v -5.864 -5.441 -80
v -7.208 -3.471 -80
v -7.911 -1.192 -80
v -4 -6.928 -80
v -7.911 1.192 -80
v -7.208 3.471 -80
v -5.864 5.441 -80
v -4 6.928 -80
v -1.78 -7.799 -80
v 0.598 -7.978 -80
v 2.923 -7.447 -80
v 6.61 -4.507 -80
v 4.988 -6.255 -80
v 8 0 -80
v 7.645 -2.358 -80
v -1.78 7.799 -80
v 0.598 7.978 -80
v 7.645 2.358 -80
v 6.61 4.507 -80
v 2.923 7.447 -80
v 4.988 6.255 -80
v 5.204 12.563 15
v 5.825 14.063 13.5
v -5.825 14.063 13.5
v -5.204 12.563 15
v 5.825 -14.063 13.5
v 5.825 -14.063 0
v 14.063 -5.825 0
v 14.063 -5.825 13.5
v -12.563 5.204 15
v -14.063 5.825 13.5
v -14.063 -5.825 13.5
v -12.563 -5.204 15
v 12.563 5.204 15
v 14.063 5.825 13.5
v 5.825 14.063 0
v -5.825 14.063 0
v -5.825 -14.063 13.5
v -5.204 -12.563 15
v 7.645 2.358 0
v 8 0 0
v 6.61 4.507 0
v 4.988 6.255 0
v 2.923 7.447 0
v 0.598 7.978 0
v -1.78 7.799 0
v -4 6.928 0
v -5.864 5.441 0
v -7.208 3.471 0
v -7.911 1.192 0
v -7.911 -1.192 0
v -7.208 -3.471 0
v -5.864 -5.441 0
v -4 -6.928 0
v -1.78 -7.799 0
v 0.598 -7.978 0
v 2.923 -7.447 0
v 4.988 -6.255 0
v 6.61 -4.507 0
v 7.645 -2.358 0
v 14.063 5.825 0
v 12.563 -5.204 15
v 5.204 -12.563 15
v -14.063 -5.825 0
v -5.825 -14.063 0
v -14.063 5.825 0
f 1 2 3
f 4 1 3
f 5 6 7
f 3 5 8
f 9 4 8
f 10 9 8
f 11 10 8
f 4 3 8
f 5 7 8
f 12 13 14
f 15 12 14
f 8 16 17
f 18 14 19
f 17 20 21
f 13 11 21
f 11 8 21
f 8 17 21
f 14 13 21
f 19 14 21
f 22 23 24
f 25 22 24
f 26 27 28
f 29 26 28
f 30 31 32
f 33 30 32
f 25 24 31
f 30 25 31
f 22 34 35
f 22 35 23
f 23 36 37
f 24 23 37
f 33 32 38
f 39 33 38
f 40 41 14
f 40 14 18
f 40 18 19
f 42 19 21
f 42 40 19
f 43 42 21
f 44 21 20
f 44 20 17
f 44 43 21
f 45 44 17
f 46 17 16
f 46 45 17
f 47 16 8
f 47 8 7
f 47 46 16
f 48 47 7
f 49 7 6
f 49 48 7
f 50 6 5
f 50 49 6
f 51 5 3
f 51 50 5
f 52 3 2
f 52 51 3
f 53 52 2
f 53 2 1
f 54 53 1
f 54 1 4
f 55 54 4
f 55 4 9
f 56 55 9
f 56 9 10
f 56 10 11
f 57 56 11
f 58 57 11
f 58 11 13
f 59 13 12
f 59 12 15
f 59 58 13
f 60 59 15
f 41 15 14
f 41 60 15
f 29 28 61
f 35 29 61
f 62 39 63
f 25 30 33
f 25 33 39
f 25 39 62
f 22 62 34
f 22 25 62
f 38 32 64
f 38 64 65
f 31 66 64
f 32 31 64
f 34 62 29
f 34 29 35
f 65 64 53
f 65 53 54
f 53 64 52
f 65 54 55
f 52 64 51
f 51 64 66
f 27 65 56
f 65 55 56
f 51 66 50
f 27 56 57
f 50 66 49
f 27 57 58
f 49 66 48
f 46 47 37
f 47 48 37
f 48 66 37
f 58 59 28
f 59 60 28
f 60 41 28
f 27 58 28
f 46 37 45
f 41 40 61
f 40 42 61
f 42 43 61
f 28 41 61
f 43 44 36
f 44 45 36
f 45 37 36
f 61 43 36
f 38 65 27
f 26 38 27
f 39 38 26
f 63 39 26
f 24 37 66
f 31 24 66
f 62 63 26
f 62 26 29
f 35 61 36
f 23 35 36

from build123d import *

# Parameters (mm, degrees)
F2_DEPTH = 15
F0_R     = 8
F3_DEPTH = 80
F4_SIZE  = 1.5


with BuildPart() as f2:
    # F1 (on face) → F2 (new body)
    with BuildSketch(Plane.XY):
        Polygon((14.062501, -5.824878), (14.062501, 5.824878), (5.824878, 14.062501), (-5.824878, 14.062501), (-14.062501, 5.824878), (-14.062501, -5.824878), (-5.824878, -14.062501), (5.824878, -14.062501), align=None)
    extrude(amount=F2_DEPTH)

    # F0 (on Top) → F3 (join)
    with BuildSketch(Plane.XY):
        Circle(F0_R)
    extrude(amount=-F3_DEPTH)

    # F4
    f4_edges = [f2.edges().sort_by_distance(p)[0] for p in [
        (0, -14.062501, 15),
        (9.94369, -9.94369, 15),
        (14.062501, 0, 15),
        (9.94369, 9.94369, 15),
        (0, 14.062501, 15),
        (-9.94369, 9.94369, 15),
        (-14.062501, 0, 15),
        (-9.94369, -9.94369, 15),
    ]]
    chamfer(f4_edges, length=F4_SIZE)


solid = f2.part
